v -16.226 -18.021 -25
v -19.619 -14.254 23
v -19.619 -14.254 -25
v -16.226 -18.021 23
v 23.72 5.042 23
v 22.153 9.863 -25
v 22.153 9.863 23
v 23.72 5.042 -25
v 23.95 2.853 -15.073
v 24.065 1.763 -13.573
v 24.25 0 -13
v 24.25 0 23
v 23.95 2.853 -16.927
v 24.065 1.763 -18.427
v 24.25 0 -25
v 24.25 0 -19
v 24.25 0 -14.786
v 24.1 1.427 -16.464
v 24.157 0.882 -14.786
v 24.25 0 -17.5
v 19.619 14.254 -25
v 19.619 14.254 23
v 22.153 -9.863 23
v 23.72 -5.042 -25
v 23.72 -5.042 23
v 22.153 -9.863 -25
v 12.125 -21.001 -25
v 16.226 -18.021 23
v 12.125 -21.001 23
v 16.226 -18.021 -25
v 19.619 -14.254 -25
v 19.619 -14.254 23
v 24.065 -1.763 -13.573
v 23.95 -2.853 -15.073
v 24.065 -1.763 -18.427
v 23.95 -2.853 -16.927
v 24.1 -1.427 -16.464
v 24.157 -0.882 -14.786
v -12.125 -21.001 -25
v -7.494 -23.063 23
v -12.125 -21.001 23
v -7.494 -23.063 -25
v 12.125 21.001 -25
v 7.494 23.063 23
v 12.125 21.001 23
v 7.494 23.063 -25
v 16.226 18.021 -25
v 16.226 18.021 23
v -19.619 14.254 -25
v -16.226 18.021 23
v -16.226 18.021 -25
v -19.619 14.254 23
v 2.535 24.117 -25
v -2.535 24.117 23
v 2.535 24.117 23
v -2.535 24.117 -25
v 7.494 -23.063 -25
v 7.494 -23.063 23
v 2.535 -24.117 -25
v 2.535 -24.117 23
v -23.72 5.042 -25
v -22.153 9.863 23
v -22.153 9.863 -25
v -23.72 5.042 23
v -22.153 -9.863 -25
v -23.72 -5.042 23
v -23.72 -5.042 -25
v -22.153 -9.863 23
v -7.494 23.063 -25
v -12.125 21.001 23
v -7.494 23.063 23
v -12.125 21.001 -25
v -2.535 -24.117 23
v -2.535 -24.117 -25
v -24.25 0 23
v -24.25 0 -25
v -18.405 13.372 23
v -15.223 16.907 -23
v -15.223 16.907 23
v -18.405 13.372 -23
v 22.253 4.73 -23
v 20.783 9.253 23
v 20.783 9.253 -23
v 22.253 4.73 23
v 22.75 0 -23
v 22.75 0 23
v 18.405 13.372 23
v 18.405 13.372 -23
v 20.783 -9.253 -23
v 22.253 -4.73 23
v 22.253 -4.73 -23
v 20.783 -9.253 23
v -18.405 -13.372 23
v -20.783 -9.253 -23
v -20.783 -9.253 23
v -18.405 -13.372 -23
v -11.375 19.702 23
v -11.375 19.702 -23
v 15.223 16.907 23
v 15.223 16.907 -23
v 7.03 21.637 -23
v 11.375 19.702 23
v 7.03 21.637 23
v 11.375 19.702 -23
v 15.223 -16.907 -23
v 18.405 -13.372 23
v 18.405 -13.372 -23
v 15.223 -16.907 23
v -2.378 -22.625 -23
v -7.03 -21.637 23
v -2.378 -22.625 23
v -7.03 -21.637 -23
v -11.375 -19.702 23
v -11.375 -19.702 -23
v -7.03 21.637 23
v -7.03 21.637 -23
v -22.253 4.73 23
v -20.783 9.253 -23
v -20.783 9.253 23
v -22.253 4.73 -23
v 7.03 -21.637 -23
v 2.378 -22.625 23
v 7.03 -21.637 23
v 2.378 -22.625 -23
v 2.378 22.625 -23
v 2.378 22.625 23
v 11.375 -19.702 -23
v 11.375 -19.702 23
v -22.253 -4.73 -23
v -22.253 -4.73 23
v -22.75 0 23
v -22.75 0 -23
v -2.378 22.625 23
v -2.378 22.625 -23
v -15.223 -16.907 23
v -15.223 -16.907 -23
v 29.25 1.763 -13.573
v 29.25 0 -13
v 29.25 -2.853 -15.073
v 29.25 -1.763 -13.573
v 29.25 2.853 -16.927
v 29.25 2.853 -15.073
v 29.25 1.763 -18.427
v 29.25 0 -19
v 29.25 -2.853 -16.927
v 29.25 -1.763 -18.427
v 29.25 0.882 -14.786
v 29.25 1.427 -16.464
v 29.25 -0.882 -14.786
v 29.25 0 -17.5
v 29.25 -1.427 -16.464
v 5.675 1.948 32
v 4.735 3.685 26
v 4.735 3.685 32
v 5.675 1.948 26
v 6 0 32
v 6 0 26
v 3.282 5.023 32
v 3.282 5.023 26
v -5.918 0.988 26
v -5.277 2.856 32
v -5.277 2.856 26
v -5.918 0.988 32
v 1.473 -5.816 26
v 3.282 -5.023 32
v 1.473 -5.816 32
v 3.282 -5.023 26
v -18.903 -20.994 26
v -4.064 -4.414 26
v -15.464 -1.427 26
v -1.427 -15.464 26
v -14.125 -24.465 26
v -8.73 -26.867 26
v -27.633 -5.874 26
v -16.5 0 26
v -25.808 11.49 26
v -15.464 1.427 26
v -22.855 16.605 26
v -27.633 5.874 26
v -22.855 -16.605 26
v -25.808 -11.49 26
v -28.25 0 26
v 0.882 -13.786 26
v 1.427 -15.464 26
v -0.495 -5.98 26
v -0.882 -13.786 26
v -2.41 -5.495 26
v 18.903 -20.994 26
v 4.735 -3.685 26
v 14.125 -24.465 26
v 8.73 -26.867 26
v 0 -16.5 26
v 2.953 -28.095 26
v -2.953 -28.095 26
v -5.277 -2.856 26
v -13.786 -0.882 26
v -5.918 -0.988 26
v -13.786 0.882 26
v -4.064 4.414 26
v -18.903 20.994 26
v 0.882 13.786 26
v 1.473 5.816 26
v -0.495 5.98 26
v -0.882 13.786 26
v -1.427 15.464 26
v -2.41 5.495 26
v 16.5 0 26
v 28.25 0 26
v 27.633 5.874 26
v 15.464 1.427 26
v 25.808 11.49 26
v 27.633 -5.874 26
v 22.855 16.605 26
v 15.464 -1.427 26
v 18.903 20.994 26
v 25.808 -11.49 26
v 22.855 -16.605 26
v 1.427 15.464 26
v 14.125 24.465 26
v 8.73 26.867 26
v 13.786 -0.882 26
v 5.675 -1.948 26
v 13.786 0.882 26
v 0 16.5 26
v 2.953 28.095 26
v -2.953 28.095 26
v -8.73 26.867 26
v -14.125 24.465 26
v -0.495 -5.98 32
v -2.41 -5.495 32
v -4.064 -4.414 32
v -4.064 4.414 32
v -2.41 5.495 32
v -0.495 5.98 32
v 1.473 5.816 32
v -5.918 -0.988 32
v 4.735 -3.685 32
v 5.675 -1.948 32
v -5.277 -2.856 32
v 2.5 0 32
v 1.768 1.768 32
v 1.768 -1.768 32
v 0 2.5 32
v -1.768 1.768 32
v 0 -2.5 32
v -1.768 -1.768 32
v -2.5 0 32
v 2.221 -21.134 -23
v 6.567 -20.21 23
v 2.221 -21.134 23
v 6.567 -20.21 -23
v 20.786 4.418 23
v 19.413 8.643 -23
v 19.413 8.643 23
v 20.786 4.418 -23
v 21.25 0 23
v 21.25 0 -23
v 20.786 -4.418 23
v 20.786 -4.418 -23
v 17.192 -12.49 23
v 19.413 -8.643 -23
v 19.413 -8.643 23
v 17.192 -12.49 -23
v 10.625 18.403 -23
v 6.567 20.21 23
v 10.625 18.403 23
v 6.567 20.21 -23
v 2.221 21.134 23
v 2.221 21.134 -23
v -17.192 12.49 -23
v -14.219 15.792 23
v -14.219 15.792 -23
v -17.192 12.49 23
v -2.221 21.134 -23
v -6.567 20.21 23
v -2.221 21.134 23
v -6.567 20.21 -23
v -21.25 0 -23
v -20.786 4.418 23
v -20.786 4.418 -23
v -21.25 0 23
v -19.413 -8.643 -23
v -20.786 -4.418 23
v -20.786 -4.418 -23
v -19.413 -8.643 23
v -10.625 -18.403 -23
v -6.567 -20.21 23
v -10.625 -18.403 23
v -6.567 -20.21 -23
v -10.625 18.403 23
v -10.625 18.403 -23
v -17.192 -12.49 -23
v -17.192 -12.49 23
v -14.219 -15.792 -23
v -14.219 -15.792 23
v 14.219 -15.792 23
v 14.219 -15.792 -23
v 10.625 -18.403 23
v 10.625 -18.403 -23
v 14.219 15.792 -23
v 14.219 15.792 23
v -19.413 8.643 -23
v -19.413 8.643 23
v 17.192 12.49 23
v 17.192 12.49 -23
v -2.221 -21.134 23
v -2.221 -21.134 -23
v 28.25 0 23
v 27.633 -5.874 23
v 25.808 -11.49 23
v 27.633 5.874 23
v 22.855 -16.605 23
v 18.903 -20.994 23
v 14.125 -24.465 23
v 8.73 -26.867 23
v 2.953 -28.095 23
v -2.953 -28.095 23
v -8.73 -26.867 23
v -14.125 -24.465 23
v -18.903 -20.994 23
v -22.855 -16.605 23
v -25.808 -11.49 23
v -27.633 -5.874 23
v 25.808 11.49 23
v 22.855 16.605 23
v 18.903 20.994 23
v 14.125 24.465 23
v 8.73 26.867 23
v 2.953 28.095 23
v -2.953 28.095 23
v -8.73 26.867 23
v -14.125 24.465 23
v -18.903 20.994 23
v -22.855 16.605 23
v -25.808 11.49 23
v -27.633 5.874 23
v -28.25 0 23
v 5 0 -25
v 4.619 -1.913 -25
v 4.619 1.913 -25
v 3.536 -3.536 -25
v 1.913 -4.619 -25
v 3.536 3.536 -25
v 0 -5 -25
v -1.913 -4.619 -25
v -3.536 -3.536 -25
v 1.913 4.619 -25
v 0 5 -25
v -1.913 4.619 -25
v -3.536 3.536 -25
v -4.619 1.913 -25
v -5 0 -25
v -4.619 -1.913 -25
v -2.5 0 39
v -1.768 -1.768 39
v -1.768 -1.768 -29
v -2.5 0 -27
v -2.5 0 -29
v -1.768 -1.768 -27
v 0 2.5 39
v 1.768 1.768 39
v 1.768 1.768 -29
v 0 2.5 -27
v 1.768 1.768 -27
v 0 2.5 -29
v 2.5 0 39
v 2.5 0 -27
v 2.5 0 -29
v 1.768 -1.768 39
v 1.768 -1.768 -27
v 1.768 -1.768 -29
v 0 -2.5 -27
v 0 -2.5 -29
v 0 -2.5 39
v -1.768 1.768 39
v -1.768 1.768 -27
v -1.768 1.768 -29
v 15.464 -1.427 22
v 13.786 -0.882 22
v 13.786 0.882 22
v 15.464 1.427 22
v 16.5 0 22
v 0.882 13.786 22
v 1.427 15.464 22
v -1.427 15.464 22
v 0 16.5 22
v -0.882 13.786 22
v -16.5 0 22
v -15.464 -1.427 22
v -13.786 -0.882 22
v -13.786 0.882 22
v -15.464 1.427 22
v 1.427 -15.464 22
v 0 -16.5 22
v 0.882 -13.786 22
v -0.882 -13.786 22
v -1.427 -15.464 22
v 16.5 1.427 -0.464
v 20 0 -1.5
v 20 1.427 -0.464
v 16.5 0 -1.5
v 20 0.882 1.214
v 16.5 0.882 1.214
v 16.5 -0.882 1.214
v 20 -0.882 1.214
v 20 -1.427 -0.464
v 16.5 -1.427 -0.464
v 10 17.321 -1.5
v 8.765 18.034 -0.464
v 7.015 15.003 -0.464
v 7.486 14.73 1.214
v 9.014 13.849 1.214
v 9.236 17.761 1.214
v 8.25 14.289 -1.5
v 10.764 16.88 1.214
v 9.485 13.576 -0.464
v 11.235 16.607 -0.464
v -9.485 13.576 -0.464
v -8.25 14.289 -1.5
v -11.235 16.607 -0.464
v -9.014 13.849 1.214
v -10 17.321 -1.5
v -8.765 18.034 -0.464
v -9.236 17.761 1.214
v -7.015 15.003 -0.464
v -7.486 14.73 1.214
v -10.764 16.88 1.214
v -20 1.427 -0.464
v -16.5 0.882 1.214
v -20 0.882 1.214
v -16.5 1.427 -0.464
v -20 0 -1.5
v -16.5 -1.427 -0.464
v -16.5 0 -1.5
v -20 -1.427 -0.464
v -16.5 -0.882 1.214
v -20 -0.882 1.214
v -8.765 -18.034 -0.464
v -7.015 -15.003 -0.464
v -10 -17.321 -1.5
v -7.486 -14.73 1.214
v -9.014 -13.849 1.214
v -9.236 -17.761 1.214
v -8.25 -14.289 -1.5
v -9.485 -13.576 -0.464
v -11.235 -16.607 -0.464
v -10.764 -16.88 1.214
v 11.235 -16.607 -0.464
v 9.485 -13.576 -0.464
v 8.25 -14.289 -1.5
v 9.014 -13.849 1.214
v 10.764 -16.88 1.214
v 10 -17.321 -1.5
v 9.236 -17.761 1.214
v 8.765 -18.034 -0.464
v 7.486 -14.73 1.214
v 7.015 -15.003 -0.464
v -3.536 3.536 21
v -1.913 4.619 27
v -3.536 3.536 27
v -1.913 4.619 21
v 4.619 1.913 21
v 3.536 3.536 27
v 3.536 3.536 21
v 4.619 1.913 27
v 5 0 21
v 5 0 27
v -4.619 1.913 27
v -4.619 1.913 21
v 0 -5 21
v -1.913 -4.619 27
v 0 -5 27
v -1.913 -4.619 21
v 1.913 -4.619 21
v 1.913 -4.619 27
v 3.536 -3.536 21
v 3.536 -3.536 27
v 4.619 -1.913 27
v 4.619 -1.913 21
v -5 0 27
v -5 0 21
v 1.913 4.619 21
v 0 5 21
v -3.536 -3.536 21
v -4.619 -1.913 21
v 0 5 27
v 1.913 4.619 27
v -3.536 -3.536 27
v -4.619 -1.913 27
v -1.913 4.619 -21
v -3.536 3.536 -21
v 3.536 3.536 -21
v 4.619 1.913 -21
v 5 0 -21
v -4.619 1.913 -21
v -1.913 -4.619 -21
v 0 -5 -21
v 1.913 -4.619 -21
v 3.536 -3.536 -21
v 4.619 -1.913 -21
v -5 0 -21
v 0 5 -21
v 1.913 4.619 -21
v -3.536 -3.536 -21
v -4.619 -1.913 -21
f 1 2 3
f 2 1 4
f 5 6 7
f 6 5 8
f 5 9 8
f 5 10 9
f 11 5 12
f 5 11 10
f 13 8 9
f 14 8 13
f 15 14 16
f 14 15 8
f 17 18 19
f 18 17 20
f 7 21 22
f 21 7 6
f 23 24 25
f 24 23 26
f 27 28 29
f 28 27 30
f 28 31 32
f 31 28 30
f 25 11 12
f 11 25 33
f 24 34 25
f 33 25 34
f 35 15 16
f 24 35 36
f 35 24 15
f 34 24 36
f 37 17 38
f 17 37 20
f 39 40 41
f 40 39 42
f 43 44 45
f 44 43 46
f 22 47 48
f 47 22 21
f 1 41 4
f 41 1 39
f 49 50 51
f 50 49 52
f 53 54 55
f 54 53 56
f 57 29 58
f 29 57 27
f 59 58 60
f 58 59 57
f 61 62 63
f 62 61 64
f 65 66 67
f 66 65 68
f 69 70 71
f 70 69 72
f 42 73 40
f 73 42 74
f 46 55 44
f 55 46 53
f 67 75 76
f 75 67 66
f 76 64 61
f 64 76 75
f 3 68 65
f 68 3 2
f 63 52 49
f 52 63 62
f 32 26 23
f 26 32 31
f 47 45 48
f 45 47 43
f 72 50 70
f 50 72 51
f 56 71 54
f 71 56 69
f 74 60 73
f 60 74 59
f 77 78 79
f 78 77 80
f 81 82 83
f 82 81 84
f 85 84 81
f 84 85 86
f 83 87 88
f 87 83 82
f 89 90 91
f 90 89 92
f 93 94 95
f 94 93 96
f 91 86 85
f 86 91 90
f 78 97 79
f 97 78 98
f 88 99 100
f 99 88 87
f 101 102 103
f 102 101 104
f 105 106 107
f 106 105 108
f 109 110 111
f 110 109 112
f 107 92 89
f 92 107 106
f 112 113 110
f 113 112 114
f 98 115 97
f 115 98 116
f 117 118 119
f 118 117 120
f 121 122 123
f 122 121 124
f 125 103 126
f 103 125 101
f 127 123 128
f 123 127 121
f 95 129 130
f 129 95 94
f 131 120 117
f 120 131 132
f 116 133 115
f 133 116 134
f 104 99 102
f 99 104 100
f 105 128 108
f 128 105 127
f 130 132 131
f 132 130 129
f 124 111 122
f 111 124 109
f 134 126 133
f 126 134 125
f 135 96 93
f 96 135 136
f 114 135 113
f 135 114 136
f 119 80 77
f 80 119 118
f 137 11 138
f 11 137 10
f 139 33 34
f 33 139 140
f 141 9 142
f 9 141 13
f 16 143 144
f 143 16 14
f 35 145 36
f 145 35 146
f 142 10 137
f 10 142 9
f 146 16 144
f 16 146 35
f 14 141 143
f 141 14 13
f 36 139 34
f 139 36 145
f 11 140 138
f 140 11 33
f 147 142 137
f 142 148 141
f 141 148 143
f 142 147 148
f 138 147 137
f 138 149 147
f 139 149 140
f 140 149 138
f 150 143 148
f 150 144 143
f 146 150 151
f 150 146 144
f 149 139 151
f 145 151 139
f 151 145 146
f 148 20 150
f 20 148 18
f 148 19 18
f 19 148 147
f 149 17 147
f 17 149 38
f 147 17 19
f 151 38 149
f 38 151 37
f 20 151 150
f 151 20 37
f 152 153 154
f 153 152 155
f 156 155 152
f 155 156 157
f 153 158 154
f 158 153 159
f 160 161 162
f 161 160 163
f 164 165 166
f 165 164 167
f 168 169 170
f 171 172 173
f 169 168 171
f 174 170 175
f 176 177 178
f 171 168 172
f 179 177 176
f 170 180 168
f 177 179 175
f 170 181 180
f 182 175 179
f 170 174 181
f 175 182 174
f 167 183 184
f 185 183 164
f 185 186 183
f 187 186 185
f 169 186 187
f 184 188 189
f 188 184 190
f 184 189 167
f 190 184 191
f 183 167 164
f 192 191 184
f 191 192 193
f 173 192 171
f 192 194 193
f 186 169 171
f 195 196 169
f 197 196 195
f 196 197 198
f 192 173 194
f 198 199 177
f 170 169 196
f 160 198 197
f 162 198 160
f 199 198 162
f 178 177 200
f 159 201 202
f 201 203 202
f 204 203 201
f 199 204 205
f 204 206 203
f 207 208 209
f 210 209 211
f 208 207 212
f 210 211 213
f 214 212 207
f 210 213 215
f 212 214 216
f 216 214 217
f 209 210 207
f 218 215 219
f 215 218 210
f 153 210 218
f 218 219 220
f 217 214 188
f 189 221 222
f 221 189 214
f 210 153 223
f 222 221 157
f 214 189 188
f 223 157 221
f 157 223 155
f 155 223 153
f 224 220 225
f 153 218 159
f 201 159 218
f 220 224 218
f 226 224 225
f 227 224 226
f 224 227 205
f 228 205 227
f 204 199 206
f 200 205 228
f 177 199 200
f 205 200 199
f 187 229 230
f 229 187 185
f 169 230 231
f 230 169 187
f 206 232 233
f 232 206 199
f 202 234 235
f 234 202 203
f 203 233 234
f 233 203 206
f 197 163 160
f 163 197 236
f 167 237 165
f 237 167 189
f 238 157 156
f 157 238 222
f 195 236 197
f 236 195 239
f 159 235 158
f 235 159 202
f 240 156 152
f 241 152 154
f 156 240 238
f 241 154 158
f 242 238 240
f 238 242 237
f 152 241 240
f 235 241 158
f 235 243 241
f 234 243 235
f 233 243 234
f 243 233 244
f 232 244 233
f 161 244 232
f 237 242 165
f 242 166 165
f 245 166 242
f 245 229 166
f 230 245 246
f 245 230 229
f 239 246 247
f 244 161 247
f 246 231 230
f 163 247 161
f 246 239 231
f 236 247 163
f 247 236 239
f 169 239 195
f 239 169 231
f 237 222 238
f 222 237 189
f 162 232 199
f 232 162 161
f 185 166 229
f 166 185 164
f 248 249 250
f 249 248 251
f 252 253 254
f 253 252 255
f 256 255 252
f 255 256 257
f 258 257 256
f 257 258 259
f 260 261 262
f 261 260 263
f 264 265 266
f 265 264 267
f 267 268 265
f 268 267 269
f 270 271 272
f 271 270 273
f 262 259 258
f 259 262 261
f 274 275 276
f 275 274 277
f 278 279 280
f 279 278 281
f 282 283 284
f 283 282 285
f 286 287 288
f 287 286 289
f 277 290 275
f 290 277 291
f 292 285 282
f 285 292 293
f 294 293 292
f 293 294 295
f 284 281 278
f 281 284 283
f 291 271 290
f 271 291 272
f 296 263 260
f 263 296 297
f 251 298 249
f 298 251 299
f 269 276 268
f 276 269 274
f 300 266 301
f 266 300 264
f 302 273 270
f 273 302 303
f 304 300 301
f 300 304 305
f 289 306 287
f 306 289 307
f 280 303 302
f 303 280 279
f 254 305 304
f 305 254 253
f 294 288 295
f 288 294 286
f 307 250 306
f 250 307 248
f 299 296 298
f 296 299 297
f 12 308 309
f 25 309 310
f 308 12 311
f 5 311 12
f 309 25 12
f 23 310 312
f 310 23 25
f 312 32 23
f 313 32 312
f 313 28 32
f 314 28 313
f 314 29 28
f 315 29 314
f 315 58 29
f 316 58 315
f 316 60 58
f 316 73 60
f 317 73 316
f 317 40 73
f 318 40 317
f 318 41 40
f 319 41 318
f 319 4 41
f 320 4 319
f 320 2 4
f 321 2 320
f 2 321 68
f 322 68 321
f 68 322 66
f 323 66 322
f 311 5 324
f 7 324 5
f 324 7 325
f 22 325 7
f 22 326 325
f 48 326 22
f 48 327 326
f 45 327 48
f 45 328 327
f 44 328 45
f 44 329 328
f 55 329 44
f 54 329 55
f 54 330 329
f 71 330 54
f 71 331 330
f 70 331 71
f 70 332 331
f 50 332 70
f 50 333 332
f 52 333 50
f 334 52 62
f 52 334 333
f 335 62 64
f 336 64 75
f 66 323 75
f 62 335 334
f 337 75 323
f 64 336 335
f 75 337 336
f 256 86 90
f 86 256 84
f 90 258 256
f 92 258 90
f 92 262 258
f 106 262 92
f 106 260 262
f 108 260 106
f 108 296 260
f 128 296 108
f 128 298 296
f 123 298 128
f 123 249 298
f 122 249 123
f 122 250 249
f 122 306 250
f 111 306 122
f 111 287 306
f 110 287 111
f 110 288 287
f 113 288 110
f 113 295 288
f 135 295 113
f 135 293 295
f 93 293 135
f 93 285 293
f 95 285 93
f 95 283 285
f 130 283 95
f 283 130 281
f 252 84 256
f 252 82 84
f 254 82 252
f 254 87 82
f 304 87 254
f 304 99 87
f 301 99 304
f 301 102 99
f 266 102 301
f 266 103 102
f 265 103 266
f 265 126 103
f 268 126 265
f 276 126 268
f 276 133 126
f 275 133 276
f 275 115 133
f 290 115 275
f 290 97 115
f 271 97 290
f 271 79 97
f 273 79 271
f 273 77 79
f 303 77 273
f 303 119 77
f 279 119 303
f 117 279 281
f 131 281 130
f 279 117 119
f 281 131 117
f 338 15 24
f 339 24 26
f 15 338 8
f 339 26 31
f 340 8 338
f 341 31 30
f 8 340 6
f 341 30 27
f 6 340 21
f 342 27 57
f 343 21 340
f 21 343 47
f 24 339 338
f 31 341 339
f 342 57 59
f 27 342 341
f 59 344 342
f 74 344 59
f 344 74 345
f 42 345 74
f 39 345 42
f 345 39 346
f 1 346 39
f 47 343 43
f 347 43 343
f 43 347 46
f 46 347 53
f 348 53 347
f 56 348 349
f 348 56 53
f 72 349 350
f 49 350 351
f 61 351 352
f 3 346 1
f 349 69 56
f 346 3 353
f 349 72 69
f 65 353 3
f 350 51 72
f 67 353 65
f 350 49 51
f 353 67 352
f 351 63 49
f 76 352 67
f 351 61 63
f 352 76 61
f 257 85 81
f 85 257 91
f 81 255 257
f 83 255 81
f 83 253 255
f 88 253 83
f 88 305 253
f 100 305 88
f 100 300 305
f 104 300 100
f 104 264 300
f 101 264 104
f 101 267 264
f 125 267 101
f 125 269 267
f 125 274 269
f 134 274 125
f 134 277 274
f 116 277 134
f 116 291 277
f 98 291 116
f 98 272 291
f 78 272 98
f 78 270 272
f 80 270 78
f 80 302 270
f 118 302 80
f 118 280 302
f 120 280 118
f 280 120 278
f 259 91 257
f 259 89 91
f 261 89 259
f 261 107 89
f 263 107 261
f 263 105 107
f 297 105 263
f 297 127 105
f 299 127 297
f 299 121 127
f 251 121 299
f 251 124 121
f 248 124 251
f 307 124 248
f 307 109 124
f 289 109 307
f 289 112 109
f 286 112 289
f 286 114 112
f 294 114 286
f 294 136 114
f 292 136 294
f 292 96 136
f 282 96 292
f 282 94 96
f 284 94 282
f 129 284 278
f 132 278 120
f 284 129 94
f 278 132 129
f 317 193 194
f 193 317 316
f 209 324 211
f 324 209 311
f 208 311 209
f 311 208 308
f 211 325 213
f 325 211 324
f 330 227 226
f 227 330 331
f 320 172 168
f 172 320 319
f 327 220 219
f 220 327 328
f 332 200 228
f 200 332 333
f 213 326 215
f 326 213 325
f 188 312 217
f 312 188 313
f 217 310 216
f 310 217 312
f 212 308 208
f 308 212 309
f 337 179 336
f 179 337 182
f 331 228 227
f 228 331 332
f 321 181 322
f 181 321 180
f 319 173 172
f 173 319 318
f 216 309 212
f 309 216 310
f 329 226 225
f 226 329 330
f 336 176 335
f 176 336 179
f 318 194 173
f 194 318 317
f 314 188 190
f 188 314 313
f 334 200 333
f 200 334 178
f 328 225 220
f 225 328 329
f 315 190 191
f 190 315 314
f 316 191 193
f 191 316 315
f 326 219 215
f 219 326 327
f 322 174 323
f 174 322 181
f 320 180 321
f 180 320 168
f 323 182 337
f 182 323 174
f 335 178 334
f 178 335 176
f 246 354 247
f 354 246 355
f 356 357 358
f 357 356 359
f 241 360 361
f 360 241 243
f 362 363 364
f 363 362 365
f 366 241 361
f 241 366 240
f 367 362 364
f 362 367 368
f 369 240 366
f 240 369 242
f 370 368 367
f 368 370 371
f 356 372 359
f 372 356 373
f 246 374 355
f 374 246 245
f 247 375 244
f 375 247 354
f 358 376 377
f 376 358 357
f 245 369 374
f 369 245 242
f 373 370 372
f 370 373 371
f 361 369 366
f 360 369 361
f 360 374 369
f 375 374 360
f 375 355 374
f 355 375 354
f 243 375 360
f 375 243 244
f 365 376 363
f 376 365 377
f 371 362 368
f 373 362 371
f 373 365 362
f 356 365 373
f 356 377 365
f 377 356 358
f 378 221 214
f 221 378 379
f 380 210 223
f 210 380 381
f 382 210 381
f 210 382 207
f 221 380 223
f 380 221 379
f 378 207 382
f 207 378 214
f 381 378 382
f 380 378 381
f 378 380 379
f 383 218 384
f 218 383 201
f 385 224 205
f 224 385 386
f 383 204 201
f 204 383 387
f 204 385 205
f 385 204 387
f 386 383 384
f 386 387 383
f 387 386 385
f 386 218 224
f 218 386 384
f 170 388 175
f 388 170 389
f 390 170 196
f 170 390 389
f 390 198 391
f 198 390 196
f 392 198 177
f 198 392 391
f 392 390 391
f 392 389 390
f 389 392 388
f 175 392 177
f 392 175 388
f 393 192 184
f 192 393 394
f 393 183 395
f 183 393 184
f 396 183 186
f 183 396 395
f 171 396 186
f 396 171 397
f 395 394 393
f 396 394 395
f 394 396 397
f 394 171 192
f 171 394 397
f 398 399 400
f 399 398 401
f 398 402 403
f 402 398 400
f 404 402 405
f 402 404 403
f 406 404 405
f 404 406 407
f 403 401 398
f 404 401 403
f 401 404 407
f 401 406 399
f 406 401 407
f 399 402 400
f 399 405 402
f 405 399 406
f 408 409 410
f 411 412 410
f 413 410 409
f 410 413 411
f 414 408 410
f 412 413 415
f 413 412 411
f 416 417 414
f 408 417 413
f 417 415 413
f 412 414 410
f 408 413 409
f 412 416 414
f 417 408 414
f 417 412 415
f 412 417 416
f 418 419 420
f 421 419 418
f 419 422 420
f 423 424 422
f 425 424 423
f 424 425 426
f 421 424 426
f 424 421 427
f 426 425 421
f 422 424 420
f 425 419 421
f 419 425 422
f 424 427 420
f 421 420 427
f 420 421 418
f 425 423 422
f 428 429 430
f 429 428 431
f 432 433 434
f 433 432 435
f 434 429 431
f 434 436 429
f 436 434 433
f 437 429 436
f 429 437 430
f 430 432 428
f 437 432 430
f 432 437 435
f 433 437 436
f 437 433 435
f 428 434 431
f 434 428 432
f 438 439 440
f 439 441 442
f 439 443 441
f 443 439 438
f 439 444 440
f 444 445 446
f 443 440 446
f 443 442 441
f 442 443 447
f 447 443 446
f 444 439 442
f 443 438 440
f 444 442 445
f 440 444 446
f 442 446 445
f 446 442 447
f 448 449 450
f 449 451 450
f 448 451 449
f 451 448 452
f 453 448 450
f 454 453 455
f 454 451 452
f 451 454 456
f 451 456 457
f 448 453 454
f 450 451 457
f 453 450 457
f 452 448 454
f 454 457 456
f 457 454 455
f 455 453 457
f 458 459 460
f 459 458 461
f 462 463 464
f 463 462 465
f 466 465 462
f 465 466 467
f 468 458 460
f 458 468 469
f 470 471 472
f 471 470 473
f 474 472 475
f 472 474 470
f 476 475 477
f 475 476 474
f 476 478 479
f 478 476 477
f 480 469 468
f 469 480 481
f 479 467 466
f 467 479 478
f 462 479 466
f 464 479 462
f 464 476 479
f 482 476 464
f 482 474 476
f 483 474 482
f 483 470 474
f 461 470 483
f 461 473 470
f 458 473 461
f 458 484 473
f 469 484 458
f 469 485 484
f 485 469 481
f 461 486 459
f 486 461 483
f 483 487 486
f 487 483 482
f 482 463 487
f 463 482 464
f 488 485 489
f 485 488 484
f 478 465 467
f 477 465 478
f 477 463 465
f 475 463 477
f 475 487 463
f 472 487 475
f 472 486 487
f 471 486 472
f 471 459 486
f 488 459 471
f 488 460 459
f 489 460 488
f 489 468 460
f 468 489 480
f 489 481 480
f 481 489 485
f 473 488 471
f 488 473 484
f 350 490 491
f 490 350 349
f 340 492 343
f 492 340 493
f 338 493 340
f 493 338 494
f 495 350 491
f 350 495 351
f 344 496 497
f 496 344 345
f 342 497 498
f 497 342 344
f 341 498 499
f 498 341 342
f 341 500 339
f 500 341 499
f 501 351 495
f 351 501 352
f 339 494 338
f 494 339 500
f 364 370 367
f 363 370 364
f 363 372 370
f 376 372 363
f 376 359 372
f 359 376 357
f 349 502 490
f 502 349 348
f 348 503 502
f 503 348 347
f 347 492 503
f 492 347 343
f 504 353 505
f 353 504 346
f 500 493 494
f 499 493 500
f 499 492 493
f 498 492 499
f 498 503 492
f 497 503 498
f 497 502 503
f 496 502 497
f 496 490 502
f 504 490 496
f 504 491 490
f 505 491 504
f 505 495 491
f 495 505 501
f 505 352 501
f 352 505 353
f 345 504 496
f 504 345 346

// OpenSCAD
// Parameters
stator_diameter_mm = 42.5; //[21.25:85:0.1]
motor_height_mm = 48; //[24:96:0.1]
shaft_diameter_mm = 5; //[2.5:10:0.1]
shaft_extension_front_mm = 15; //[7.5:30:0.1]
shaft_extension_rear_mm = 5; //[2.5:10:0.1]
housing_wall_thickness_mm = 1.5; //[0.75:3:0.1]
endcap_thickness_mm = 2; //[1:4:0.1]
air_gap_mm = 0.5; //[0.25:1:0.05]
bearing_outer_diameter_mm = 10; //[5:20:0.1]
bearing_thickness_mm = 4; //[2:8:0.1]
mounting_hole_count = 4; //[3:8:1]
mounting_hole_diameter_mm = 3; //[1.5:6:0.1]
mounting_bolt_circle_diameter_mm = 30; //[15:60:0.1]
overlap_mm = 1; //[0.5:2:0.1]
housing_extra_radius_mm = 1; //[0.5:3:0.1]
mounting_face_thickness_mm = 3; //[1.5:6:0.1]
mounting_face_extra_radius_mm = 4; //[2:10:0.1]
wire_grommet_radius_mm = 3; //[1.5:6:0.1]
wire_grommet_length_mm = 6; //[3:12:0.1]
wire_grommet_hole_radius_mm = 1.5; //[0.75:3:0.1]
vent_hole_diameter_mm = 3; //[1.5:6:0.1]
vent_hole_count = 6; //[3:12:1]
vent_hole_radial_offset_mm = 6; //[3:12:0.1]
buzzer_diameter_mm = 12; //[6:24:0.1]
buzzer_height_mm = 6; //[3:12:0.1]
buzzer_pin_diameter_mm = 2; //[1:4:0.1]
buzzer_pin_height_mm = 3; //[1.5:6:0.1]

// Buzzer - complete geometry
module buzzer() {
  color("Black") {
    // Buzzer body
    cylinder(r=buzzer_diameter_mm/2, h=buzzer_height_mm, center=true);
    // Buzzer pin
    translate([0, 0, buzzer_height_mm/2 - overlap_mm + buzzer_pin_height_mm/2])
      cylinder(r=buzzer_pin_diameter_mm/2, h=buzzer_pin_height_mm, center=true);
  }
}

// Motor assembly
module assembly() {
  difference() {
    union() {
      // Stator core
      color("DimGray")
      cylinder(r=stator_diameter_mm/2, h=motor_height_mm, center=true);

      // Rotor can
      color("Black")
      difference() {
        cylinder(r=stator_diameter_mm/2 + air_gap_mm + housing_wall_thickness_mm + housing_extra_radius_mm, h=motor_height_mm, center=true);
        cylinder(r=stator_diameter_mm/2 + air_gap_mm + housing_extra_radius_mm, h=motor_height_mm + overlap_mm*2, center=true);
      }

      // Endcaps
      color("Silver")
      translate([0, 0, motor_height_mm/2 - endcap_thickness_mm/2 + overlap_mm])
        cylinder(r=stator_diameter_mm/2 + air_gap_mm + housing_wall_thickness_mm + housing_extra_radius_mm, h=endcap_thickness_mm, center=true);
      translate([0, 0, -motor_height_mm/2 + endcap_thickness_mm/2 - overlap_mm])
        cylinder(r=stator_diameter_mm/2 + air_gap_mm + housing_wall_thickness_mm + housing_extra_radius_mm, h=endcap_thickness_mm, center=true);

      // Mounting face
      color("Silver")
      translate([0, 0, motor_height_mm/2 + mounting_face_thickness_mm/2 - overlap_mm])
        cylinder(r=stator_diameter_mm/2 + air_gap_mm + housing_wall_thickness_mm + housing_extra_radius_mm + mounting_face_extra_radius_mm, h=mounting_face_thickness_mm, center=true);

      // Central shaft
      color("Silver")
      translate([0, 0, (shaft_extension_front_mm - shaft_extension_rear_mm)/2])
        cylinder(r=shaft_diameter_mm/2, h=motor_height_mm + shaft_extension_front_mm + shaft_extension_rear_mm, center=true);

      // Wire exit grommet
      color("Black")
      difference() {
        translate([stator_diameter_mm/2 + air_gap_mm + housing_wall_thickness_mm + housing_extra_radius_mm + wire_grommet_length_mm/2 - overlap_mm, 0, -motor_height_mm/2 + endcap_thickness_mm + wire_grommet_radius_mm*2])
          rotate([0, 90, 0])
          cylinder(r=wire_grommet_radius_mm, h=wire_grommet_length_mm, center=true);
        translate([stator_diameter_mm/2 + air_gap_mm + housing_wall_thickness_mm + housing_extra_radius_mm + wire_grommet_length_mm/2 - overlap_mm, 0, -motor_height_mm/2 + endcap_thickness_mm + wire_grommet_radius_mm*2])
          rotate([0, 90, 0])
          cylinder(r=wire_grommet_hole_radius_mm, h=wire_grommet_length_mm + overlap_mm*2, center=true);
      }

      // Buzzer
      translate([0, 0, motor_height_mm/2 + mounting_face_thickness_mm + buzzer_height_mm/2 - overlap_mm])
        buzzer();
    }

    // Bearing seats
    translate([0, 0, motor_height_mm/2 - endcap_thickness_mm/2 + overlap_mm])
      cylinder(r=bearing_outer_diameter_mm/2, h=bearing_thickness_mm + overlap_mm*2, center=true);
    translate([0, 0, -motor_height_mm/2 + endcap_thickness_mm/2 - overlap_mm])
      cylinder(r=bearing_outer_diameter_mm/2, h=bearing_thickness_mm + overlap_mm*2, center=true);

    // Mounting holes
    for (i = [0:3]) {
      rotate([0, 0, i*90])
        translate([mounting_bolt_circle_diameter_mm/2, 0, motor_height_mm/2 + mounting_face_thickness_mm/2 - overlap_mm])
        cylinder(r=mounting_hole_diameter_mm/2, h=mounting_face_thickness_mm + overlap_mm*2, center=true);
    }

    // Vent holes
    for (i = [0:5]) {
      rotate([0, 0, i*60])
        translate([stator_diameter_mm/2 + air_gap_mm + housing_wall_thickness_mm + housing_extra_radius_mm - vent_hole_radial_offset_mm, 0, 0])
        rotate([0, 90, 0])
        cylinder(r=vent_hole_diameter_mm/2, h=housing_wall_thickness_mm + overlap_mm*2, center=true);
    }
  }
}

// Final assembly call
assembly();
